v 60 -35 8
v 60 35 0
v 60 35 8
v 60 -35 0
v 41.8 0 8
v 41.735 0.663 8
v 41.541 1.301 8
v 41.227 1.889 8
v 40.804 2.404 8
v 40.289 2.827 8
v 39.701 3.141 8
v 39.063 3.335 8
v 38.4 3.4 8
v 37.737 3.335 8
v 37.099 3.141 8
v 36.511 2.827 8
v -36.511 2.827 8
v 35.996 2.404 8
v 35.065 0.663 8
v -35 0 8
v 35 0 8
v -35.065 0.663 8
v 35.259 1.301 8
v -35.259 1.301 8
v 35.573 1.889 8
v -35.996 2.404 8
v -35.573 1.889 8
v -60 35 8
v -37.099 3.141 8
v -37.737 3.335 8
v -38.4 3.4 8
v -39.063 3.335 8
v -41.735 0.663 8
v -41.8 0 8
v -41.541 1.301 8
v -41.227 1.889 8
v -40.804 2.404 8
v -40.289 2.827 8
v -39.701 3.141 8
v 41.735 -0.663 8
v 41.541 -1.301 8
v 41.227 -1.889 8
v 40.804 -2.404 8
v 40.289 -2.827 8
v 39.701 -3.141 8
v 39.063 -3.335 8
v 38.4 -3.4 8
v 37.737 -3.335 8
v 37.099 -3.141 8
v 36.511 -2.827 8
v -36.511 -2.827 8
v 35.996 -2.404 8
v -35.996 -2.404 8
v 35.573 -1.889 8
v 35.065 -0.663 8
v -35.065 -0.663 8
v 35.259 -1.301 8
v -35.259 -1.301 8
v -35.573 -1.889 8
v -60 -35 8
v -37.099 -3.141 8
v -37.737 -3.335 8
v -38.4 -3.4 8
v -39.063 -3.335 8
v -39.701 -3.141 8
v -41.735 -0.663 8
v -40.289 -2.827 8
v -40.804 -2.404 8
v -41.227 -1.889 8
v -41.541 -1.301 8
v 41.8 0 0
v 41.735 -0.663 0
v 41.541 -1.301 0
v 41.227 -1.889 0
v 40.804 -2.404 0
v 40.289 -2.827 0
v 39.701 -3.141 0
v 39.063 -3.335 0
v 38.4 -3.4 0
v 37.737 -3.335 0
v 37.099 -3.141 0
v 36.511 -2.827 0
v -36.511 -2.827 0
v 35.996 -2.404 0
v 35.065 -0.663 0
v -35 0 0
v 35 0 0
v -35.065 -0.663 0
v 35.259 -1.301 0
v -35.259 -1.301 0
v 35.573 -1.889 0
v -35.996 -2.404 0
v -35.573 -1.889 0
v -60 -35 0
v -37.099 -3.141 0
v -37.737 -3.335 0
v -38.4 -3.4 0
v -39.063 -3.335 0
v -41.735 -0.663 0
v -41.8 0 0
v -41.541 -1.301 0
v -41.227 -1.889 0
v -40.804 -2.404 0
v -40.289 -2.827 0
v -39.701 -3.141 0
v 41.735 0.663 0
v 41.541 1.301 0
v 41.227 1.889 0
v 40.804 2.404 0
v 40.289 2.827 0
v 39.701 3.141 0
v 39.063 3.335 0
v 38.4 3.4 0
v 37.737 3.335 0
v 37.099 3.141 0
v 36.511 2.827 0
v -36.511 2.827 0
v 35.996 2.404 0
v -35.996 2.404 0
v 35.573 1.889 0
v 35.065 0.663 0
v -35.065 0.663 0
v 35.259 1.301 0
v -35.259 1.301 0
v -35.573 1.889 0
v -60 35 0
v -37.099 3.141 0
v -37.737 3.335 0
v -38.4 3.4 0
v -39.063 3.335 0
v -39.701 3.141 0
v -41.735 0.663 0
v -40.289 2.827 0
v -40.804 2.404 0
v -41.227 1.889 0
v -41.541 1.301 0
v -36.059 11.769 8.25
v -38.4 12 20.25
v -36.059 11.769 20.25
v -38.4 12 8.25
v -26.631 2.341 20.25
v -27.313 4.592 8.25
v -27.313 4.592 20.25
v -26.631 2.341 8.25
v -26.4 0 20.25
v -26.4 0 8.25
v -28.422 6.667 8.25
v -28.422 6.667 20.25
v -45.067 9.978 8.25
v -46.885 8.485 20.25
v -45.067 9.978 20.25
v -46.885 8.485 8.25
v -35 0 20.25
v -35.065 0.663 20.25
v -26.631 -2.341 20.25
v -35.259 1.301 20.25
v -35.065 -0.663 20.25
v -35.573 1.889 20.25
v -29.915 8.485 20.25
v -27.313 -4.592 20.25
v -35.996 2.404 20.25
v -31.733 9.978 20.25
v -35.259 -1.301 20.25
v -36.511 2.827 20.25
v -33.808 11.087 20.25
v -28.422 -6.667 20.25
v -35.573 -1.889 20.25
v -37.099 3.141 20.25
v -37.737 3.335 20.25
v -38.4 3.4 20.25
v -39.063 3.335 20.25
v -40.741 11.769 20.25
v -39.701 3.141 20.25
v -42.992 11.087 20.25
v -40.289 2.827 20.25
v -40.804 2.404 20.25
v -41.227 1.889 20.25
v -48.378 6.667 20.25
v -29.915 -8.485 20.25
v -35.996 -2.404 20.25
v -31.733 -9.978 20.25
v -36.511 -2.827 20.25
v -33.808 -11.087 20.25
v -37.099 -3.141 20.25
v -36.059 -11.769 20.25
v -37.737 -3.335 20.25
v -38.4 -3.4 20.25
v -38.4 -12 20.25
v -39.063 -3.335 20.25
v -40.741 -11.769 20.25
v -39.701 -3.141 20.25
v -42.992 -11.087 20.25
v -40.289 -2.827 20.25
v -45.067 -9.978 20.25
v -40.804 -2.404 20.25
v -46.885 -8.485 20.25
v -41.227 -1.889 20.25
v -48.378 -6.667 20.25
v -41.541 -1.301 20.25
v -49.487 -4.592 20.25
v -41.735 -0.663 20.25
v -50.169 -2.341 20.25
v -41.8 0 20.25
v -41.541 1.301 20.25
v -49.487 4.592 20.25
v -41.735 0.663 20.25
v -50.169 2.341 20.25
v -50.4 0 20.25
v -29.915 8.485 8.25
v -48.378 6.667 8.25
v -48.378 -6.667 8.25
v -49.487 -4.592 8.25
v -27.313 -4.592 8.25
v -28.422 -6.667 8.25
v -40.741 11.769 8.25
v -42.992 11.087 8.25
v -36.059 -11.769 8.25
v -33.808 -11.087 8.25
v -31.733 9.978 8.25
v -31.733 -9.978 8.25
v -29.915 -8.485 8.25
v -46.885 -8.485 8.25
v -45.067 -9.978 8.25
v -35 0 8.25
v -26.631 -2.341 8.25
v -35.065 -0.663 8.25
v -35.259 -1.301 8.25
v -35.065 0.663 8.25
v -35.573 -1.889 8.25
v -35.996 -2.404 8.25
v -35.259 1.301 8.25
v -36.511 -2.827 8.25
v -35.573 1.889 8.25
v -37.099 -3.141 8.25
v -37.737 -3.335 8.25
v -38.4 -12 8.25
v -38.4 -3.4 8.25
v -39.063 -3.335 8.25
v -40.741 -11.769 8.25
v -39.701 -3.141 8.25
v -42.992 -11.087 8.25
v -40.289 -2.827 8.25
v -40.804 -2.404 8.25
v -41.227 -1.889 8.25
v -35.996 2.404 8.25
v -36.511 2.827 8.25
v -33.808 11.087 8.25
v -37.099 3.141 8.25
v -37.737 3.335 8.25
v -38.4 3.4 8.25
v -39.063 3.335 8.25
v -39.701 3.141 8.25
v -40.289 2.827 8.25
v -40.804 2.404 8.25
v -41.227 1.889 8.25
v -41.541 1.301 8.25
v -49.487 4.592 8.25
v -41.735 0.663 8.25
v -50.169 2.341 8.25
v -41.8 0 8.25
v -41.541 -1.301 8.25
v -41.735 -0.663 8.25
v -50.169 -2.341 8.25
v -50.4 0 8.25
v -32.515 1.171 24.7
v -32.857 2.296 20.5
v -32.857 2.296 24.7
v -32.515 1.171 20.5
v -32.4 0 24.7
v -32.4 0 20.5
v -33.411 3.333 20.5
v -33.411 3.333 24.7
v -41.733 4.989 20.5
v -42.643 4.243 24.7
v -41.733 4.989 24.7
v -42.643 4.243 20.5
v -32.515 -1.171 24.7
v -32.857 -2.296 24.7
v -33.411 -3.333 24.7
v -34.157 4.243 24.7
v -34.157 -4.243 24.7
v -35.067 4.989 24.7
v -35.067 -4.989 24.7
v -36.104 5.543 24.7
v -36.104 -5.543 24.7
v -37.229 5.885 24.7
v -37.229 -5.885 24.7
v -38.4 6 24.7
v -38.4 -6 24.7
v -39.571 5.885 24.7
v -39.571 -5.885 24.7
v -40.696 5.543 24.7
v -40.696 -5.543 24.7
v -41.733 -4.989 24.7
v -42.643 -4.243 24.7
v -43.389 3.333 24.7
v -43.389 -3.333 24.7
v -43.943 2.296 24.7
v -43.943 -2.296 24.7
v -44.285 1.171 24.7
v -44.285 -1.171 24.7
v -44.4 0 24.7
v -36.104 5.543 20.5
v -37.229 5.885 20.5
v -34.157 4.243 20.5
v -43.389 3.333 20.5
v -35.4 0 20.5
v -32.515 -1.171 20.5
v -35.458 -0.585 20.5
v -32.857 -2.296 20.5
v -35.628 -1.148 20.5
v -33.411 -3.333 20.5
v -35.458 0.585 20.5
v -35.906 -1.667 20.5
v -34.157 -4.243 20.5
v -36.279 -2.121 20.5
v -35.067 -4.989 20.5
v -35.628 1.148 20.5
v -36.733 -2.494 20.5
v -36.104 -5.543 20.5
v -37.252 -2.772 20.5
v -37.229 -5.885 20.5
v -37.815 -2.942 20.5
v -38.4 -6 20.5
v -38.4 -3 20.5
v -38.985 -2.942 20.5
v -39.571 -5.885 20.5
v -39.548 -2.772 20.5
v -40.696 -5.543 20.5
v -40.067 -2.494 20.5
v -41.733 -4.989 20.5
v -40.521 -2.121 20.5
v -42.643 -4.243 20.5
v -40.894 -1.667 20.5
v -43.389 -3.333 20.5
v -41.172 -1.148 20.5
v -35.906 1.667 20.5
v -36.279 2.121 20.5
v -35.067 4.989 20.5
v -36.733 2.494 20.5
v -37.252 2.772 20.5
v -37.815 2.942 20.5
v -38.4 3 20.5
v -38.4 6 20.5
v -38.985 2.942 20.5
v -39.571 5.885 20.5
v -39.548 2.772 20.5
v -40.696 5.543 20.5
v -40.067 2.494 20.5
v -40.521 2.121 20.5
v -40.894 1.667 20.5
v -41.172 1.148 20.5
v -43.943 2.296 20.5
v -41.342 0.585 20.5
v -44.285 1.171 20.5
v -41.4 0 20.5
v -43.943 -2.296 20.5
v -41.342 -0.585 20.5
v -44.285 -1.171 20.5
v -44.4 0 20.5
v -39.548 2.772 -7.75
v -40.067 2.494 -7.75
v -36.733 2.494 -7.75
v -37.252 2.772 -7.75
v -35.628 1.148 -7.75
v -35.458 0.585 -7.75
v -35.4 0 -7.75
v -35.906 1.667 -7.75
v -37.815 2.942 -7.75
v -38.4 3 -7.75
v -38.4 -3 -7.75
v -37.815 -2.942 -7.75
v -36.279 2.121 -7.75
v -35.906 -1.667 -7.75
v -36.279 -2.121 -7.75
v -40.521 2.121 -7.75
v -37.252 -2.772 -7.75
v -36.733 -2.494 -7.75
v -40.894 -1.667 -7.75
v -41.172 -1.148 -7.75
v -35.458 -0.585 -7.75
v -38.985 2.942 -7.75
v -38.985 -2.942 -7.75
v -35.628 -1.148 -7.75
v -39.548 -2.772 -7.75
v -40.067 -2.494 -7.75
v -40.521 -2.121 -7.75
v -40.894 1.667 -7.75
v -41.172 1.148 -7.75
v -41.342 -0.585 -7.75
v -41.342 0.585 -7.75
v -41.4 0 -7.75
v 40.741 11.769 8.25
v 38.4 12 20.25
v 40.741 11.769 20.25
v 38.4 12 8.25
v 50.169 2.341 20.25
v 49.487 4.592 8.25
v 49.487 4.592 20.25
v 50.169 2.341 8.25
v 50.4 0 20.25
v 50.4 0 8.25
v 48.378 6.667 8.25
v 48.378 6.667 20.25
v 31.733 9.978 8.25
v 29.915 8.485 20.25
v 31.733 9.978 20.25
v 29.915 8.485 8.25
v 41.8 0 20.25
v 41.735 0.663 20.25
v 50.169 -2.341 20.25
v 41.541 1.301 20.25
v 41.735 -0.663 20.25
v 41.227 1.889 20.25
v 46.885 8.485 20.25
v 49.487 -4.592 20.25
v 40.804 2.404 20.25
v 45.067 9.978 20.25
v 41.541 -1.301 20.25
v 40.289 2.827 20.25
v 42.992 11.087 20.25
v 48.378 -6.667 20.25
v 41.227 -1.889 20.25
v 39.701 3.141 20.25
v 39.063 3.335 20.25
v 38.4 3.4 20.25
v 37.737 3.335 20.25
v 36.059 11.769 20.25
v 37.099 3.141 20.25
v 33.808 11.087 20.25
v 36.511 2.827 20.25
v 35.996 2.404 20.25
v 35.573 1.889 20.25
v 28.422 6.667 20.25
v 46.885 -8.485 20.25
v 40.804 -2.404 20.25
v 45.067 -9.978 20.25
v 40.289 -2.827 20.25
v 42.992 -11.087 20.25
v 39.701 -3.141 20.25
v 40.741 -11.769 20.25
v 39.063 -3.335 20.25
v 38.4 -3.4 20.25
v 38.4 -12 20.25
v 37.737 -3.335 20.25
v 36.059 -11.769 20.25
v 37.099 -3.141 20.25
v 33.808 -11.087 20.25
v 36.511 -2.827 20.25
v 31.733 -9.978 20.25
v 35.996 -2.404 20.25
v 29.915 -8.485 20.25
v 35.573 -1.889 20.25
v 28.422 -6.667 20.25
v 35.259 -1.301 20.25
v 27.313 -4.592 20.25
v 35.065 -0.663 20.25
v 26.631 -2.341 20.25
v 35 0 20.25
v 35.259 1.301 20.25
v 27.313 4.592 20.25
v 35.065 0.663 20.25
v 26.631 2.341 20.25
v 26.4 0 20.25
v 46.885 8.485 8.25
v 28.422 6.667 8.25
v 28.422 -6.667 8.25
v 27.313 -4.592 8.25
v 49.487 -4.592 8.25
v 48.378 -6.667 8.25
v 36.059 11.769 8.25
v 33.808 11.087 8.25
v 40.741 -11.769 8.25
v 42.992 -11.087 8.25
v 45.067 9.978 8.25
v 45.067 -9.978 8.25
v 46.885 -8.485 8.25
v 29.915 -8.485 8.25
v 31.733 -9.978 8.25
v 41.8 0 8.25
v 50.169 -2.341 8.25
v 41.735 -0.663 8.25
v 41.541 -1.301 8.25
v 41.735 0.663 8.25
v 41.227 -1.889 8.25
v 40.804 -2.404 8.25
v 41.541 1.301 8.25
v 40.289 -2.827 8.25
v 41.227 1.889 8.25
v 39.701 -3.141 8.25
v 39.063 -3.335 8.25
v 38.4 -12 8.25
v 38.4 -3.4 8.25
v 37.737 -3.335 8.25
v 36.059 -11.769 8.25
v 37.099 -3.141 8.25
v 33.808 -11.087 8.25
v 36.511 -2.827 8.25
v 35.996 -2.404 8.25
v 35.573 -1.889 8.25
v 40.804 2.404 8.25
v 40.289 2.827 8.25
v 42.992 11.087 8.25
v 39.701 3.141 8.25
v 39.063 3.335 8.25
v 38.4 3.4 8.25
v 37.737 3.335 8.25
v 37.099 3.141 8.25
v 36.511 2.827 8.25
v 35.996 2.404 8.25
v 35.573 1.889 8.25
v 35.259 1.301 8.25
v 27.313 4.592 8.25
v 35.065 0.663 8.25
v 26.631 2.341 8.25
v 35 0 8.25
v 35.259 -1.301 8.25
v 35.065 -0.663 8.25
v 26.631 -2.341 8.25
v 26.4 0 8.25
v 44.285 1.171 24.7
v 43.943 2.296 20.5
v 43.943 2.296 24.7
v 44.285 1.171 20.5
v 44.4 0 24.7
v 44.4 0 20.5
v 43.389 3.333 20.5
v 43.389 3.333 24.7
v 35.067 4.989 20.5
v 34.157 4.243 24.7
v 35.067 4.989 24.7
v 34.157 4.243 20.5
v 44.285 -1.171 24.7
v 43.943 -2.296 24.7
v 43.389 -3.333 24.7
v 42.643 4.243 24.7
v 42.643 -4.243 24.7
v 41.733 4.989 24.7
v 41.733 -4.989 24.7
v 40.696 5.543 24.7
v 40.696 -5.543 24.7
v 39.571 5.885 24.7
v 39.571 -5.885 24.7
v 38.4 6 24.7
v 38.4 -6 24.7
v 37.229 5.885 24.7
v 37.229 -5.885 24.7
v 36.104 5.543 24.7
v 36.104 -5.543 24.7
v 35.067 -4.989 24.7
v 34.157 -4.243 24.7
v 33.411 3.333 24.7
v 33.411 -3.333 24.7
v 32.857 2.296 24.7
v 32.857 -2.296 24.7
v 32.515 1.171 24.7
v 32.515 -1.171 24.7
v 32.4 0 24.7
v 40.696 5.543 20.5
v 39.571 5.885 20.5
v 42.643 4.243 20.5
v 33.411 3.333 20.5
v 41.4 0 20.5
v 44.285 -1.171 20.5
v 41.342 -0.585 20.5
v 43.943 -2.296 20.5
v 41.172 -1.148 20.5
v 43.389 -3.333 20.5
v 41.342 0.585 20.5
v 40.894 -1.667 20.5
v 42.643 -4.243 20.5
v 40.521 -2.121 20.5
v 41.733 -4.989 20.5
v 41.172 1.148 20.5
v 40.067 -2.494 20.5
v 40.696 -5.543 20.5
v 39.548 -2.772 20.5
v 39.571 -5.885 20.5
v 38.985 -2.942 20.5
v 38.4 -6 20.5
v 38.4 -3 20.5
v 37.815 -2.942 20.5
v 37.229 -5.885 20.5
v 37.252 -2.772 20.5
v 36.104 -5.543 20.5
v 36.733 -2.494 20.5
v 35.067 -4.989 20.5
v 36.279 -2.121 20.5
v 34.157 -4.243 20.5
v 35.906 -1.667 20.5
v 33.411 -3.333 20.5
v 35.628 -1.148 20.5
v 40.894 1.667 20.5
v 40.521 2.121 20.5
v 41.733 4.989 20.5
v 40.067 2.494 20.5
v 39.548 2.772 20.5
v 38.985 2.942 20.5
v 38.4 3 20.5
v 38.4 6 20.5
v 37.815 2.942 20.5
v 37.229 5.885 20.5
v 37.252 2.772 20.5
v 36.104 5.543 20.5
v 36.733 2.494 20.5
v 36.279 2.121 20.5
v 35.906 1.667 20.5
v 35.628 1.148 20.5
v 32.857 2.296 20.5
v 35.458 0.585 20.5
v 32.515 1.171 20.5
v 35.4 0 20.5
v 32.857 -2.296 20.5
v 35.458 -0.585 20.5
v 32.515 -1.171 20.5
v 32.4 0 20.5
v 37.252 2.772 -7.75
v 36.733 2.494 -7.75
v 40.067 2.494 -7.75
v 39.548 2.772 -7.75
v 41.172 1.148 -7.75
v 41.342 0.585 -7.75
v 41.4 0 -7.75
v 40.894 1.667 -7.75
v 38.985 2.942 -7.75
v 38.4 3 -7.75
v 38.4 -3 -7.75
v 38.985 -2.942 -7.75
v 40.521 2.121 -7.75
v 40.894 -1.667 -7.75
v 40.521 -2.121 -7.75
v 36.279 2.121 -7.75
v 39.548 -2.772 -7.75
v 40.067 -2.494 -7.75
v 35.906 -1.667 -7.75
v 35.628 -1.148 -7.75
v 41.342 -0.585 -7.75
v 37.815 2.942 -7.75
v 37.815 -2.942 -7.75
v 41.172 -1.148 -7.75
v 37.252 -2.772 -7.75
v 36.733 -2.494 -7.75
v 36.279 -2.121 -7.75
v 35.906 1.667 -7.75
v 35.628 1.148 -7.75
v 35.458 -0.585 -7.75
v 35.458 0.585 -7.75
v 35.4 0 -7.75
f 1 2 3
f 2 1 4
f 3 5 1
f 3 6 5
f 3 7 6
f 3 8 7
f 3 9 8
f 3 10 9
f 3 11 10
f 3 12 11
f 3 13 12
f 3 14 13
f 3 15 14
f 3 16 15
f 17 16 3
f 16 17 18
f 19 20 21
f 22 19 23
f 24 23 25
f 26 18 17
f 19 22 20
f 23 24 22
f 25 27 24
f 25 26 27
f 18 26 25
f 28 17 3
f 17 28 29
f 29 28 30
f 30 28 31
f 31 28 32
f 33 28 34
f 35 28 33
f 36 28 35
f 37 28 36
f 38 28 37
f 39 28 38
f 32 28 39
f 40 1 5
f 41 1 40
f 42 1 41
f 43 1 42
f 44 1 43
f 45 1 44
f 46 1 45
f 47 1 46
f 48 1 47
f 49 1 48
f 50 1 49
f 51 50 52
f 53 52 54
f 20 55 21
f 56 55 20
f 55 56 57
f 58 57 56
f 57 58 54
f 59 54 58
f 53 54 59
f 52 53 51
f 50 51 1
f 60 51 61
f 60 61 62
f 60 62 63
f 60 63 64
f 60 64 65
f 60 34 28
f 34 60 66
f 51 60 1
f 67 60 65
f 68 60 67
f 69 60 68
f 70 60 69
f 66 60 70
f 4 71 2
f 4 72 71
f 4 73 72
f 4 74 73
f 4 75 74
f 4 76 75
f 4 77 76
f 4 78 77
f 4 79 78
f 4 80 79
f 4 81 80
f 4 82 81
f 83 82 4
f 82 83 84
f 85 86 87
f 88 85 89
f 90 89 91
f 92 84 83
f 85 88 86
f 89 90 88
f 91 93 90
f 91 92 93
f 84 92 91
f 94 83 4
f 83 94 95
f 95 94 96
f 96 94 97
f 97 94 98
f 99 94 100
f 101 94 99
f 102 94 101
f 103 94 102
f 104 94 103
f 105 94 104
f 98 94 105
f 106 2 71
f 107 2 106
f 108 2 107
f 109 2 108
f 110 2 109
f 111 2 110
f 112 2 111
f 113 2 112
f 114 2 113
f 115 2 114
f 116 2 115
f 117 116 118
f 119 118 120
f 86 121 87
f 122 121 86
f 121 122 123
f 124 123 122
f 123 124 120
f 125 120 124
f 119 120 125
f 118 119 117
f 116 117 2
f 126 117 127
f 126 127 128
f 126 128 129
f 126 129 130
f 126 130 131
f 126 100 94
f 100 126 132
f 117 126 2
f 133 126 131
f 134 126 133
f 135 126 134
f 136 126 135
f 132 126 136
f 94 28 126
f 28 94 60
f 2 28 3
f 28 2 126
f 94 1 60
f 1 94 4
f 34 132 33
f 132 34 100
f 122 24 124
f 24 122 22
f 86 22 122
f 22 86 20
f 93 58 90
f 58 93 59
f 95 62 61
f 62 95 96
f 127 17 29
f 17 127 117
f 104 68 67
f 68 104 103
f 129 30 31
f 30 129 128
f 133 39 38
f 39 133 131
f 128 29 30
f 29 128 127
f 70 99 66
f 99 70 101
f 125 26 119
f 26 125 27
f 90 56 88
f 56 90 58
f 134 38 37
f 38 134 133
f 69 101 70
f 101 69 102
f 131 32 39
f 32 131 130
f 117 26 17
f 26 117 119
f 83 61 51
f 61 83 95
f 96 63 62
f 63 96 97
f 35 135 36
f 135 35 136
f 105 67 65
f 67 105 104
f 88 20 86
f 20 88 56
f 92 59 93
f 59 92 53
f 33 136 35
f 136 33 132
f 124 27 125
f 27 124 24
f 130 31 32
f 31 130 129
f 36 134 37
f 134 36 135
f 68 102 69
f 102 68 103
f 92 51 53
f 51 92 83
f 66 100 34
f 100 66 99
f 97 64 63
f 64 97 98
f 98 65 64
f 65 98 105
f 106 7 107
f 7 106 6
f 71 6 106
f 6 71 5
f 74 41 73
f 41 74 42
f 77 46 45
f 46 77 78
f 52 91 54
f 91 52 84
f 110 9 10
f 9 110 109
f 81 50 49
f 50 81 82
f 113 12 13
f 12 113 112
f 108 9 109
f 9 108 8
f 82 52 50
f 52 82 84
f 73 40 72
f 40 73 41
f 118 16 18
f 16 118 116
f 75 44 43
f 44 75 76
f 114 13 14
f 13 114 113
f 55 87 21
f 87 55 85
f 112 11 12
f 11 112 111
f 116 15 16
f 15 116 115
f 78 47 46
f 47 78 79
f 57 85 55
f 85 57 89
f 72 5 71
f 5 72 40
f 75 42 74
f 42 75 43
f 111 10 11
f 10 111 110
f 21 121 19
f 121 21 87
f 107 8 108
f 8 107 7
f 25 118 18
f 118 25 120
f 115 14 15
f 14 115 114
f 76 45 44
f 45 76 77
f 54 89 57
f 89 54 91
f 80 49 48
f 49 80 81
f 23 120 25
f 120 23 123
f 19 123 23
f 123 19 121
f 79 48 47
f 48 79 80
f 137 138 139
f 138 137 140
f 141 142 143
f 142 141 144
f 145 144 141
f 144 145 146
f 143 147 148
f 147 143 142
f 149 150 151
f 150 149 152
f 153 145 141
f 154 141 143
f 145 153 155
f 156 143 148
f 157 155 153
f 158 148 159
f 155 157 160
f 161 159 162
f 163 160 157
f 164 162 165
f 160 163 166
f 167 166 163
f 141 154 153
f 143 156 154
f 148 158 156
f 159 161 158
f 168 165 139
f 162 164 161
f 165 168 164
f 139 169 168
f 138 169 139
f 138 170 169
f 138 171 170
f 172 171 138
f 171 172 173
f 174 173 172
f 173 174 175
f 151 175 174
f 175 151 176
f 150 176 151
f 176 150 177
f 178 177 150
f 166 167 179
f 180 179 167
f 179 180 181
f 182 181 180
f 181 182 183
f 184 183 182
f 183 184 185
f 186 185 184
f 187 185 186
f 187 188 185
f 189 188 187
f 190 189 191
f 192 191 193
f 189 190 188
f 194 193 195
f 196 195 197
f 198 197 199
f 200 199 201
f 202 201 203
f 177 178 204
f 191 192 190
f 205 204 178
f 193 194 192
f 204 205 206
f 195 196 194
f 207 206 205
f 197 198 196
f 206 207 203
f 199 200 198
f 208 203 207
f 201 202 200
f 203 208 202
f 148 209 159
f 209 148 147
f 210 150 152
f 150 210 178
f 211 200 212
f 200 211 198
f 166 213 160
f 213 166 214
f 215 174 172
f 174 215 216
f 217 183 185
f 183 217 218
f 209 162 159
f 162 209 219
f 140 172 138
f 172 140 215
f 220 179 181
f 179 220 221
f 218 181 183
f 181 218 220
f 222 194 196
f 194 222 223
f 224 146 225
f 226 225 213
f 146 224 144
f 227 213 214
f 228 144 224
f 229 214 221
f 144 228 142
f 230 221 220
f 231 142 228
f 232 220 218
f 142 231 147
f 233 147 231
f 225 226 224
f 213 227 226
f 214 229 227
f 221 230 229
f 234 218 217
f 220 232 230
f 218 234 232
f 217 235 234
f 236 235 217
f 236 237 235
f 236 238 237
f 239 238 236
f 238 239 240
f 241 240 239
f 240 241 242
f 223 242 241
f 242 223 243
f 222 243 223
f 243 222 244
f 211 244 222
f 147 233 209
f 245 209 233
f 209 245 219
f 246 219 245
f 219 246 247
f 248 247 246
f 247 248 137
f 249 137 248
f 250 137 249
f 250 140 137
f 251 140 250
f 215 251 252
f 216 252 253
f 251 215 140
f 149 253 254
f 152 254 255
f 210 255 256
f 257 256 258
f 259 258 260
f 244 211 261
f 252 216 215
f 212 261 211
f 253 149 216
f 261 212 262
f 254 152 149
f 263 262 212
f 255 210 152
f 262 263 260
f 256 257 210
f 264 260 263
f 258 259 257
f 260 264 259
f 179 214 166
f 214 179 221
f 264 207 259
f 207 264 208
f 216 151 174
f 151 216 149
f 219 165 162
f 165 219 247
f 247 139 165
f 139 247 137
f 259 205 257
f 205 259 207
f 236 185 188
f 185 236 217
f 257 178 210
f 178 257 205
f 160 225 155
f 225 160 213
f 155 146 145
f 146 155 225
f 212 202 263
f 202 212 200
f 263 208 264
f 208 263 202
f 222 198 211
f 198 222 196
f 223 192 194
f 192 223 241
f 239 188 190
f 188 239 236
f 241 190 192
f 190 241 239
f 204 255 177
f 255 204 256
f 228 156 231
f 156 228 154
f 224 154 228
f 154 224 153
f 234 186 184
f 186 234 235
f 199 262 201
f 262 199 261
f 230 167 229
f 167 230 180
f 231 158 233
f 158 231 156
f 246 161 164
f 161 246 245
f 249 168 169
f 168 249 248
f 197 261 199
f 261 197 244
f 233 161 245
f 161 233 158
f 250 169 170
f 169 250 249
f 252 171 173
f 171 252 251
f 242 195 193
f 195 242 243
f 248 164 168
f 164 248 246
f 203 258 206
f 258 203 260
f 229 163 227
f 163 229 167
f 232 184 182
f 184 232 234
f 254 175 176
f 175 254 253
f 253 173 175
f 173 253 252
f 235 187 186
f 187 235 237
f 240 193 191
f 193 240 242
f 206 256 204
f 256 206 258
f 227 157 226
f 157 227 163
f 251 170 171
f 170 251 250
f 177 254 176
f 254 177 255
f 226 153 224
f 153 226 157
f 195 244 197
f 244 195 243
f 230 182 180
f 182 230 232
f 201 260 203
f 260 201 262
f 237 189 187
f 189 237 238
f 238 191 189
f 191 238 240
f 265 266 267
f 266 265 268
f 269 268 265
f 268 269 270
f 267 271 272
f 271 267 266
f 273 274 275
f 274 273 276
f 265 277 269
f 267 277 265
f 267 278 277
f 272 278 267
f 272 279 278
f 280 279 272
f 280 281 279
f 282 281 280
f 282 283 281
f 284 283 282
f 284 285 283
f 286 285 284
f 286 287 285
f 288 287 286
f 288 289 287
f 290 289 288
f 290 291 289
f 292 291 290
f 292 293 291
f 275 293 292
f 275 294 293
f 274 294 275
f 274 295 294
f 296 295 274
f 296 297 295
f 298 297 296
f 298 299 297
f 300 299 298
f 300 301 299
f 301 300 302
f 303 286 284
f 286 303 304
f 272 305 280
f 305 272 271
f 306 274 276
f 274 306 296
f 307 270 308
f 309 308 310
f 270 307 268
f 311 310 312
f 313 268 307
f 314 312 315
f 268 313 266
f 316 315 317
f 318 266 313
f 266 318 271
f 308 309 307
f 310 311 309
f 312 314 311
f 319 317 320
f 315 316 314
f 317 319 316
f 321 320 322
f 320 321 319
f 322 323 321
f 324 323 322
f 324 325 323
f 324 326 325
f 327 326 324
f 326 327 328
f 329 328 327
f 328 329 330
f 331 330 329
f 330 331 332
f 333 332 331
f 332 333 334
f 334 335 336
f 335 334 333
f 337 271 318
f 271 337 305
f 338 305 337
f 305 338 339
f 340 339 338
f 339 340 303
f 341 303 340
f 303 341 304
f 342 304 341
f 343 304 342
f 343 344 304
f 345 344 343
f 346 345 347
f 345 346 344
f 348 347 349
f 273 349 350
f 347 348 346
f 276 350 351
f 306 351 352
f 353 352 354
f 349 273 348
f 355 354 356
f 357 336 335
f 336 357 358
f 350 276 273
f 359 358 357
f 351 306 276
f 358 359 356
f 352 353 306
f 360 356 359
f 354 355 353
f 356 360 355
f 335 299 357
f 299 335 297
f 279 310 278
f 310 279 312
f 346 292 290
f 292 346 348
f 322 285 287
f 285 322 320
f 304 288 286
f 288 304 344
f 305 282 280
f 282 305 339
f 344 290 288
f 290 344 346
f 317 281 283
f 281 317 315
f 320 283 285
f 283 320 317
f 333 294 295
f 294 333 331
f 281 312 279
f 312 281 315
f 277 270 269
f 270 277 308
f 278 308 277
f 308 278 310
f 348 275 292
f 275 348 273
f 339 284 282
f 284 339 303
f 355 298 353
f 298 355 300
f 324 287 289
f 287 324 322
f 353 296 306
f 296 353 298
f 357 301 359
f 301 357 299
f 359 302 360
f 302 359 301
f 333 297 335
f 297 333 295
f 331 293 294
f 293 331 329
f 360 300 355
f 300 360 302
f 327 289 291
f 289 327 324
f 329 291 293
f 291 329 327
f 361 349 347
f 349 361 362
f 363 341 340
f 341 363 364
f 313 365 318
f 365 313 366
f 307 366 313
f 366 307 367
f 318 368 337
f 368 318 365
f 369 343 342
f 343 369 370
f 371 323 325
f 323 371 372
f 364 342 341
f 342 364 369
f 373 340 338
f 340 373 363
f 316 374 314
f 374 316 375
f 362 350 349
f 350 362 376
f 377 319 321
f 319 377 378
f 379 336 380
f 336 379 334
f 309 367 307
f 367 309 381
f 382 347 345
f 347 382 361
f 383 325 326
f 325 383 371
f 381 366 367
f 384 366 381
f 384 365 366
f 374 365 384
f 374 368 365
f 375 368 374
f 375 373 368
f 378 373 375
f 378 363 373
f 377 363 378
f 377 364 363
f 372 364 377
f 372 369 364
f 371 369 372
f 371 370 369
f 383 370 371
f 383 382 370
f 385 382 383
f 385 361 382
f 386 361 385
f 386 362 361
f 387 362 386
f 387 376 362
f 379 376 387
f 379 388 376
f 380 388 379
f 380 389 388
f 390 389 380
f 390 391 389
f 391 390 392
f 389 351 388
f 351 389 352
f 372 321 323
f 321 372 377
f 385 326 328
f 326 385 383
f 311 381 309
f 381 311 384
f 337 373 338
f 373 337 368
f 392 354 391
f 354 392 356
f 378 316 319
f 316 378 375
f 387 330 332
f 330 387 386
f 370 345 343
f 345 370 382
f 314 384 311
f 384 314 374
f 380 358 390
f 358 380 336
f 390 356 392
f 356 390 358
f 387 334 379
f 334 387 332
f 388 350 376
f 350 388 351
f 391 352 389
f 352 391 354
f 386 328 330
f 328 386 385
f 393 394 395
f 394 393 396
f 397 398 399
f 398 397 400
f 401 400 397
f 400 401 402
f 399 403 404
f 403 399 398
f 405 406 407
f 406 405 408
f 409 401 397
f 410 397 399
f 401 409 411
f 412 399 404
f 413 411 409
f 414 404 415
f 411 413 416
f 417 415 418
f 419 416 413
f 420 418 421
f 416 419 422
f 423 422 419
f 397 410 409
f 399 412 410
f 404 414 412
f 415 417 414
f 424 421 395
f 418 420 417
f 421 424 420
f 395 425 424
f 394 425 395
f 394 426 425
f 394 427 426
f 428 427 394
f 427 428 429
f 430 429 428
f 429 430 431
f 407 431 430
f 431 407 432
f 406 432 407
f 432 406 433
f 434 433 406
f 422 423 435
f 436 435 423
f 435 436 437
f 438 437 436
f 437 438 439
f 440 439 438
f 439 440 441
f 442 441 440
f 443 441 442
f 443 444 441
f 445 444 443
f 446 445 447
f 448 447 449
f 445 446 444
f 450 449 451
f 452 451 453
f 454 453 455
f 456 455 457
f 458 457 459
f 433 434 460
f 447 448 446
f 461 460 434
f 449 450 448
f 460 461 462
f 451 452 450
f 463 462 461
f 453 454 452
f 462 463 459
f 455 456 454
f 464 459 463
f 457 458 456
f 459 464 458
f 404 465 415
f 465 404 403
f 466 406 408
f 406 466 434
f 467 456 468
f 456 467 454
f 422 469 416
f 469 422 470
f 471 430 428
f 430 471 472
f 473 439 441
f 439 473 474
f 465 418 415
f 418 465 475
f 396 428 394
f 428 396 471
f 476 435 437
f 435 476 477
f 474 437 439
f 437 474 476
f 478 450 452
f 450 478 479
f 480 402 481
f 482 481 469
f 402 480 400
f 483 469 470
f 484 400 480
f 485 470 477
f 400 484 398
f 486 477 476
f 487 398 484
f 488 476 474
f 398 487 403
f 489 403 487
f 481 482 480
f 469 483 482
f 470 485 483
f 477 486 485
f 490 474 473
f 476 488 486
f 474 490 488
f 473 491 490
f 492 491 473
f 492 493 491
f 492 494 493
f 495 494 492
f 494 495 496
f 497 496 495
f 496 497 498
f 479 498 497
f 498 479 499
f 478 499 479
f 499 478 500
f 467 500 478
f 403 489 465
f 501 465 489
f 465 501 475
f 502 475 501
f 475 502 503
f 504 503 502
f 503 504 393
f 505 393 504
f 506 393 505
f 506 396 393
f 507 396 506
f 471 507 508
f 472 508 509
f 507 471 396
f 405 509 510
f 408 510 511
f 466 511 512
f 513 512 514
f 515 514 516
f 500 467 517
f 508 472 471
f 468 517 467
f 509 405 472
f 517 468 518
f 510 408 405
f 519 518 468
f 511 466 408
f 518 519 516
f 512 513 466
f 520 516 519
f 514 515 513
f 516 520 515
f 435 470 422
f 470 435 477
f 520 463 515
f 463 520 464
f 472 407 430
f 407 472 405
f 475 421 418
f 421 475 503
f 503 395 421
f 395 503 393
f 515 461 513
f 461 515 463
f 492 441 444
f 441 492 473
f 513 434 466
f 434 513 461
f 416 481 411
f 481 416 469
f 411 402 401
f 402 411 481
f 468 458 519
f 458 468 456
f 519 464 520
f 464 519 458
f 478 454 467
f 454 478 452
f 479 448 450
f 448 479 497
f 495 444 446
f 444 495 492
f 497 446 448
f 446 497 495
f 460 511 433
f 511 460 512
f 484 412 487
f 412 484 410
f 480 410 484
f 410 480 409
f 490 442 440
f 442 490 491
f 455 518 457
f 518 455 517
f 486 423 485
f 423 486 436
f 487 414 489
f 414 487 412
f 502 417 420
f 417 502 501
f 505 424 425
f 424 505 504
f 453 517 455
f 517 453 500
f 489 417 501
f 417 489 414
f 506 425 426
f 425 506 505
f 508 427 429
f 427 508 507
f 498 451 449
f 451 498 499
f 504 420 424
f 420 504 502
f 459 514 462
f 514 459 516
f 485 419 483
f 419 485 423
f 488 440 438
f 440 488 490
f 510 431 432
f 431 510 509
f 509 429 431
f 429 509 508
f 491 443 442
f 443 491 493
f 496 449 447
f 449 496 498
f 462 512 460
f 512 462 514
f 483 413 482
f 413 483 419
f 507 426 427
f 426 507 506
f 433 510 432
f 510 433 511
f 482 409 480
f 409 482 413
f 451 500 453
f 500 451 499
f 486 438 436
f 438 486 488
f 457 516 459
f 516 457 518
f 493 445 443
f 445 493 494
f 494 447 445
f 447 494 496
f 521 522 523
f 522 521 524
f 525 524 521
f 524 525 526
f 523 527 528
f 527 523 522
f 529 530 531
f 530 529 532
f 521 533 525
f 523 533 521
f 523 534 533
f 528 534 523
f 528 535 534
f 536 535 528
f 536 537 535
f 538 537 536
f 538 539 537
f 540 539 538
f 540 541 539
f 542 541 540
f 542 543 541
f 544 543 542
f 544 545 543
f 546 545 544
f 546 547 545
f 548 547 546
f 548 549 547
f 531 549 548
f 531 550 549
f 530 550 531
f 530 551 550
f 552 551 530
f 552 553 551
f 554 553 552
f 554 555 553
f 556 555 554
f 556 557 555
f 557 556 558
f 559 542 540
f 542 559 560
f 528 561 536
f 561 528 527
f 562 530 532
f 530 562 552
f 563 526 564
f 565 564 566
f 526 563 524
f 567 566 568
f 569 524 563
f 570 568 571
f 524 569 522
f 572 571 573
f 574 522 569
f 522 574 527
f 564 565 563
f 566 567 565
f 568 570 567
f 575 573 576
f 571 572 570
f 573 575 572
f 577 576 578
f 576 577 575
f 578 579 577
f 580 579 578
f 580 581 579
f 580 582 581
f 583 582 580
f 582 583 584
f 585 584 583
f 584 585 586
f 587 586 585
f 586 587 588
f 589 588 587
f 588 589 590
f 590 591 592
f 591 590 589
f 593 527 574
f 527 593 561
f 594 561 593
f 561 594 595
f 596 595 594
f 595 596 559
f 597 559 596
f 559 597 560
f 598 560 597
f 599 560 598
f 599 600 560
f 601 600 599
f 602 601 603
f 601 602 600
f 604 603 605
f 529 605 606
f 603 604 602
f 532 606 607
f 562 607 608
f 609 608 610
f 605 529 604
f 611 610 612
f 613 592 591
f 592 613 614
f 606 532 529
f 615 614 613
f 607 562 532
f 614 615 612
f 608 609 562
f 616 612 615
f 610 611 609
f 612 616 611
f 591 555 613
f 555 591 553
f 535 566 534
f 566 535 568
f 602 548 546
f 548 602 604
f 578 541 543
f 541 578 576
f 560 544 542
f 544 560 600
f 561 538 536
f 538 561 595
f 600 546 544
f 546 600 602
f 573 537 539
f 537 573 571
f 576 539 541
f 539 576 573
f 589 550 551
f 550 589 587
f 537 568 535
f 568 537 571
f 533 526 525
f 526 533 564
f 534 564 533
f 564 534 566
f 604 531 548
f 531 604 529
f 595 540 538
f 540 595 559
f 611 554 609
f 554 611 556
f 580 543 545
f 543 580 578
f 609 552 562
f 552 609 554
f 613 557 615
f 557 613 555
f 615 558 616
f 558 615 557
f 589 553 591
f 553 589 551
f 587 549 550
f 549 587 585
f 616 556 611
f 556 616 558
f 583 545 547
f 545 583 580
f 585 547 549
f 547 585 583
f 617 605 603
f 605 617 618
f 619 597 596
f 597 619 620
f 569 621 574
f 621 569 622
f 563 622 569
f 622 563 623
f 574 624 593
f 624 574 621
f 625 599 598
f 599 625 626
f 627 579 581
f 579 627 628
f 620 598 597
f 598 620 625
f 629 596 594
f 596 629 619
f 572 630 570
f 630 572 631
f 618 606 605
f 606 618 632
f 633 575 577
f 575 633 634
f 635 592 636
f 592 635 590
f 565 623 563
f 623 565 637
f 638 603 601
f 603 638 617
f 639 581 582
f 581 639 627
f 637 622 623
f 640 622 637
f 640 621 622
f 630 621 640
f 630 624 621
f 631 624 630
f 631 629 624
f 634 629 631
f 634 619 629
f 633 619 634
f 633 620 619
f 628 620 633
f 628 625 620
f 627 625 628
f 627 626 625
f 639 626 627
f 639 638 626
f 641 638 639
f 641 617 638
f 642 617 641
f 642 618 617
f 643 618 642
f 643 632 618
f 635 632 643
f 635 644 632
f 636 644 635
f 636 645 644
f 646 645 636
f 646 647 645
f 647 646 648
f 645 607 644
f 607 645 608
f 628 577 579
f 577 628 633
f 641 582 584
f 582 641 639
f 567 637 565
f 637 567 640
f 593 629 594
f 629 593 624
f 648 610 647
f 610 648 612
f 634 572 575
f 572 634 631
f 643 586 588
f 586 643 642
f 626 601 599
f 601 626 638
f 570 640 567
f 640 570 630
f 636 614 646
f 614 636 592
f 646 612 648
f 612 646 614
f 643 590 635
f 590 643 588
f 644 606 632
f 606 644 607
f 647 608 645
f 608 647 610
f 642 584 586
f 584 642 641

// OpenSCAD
$fn = 32;

// ------------------------------------------------------------------------
// Standoff columns: 2 d24 standoffs, bolts d6
// Every part is its own module, assembly() places them once.
// ------------------------------------------------------------------------

// --- part 1 ---
module base_plate() {
  difference() {
    translate([-60, -35, 0]) cube([120, 70, 8]);
    translate([-38.4, 0, -1]) cylinder(h = 10, d = 6.8);
    translate([38.4, 0, -1]) cylinder(h = 10, d = 6.8);
  }
}

// --- part 2 ---
module spacer1() {
  difference() {
      translate([0, 0, 0]) cylinder(h = 12, d = 24);
      translate([0, 0, -1]) cylinder(h = 14, d = 6.8);
    }
}

// --- part 3 ---
module bolt1() {
  cylinder(h = 4.2, d = 12);
  translate([0, 0, -28.25]) cylinder(h = 28.25, d = 6);
}

// --- part 4 ---
module spacer2() {
  difference() {
      translate([0, 0, 0]) cylinder(h = 12, d = 24);
      translate([0, 0, -1]) cylinder(h = 14, d = 6.8);
    }
}

// --- part 5 ---
module bolt2() {
  cylinder(h = 4.2, d = 12);
  translate([0, 0, -28.25]) cylinder(h = 28.25, d = 6);
}

// --- assembly ---
module assembly() {
  translate([0, 0, 0]) rotate([0, 0, 0]) base_plate();
  translate([-38.4, 0, 8.25]) rotate([0, 0, 0]) spacer1();
  translate([-38.4, 0, 20.5]) rotate([0, 0, 0]) bolt1();
  translate([38.4, 0, 8.25]) rotate([0, 0, 0]) spacer2();
  translate([38.4, 0, 20.5]) rotate([0, 0, 0]) bolt2();
}

assembly();
